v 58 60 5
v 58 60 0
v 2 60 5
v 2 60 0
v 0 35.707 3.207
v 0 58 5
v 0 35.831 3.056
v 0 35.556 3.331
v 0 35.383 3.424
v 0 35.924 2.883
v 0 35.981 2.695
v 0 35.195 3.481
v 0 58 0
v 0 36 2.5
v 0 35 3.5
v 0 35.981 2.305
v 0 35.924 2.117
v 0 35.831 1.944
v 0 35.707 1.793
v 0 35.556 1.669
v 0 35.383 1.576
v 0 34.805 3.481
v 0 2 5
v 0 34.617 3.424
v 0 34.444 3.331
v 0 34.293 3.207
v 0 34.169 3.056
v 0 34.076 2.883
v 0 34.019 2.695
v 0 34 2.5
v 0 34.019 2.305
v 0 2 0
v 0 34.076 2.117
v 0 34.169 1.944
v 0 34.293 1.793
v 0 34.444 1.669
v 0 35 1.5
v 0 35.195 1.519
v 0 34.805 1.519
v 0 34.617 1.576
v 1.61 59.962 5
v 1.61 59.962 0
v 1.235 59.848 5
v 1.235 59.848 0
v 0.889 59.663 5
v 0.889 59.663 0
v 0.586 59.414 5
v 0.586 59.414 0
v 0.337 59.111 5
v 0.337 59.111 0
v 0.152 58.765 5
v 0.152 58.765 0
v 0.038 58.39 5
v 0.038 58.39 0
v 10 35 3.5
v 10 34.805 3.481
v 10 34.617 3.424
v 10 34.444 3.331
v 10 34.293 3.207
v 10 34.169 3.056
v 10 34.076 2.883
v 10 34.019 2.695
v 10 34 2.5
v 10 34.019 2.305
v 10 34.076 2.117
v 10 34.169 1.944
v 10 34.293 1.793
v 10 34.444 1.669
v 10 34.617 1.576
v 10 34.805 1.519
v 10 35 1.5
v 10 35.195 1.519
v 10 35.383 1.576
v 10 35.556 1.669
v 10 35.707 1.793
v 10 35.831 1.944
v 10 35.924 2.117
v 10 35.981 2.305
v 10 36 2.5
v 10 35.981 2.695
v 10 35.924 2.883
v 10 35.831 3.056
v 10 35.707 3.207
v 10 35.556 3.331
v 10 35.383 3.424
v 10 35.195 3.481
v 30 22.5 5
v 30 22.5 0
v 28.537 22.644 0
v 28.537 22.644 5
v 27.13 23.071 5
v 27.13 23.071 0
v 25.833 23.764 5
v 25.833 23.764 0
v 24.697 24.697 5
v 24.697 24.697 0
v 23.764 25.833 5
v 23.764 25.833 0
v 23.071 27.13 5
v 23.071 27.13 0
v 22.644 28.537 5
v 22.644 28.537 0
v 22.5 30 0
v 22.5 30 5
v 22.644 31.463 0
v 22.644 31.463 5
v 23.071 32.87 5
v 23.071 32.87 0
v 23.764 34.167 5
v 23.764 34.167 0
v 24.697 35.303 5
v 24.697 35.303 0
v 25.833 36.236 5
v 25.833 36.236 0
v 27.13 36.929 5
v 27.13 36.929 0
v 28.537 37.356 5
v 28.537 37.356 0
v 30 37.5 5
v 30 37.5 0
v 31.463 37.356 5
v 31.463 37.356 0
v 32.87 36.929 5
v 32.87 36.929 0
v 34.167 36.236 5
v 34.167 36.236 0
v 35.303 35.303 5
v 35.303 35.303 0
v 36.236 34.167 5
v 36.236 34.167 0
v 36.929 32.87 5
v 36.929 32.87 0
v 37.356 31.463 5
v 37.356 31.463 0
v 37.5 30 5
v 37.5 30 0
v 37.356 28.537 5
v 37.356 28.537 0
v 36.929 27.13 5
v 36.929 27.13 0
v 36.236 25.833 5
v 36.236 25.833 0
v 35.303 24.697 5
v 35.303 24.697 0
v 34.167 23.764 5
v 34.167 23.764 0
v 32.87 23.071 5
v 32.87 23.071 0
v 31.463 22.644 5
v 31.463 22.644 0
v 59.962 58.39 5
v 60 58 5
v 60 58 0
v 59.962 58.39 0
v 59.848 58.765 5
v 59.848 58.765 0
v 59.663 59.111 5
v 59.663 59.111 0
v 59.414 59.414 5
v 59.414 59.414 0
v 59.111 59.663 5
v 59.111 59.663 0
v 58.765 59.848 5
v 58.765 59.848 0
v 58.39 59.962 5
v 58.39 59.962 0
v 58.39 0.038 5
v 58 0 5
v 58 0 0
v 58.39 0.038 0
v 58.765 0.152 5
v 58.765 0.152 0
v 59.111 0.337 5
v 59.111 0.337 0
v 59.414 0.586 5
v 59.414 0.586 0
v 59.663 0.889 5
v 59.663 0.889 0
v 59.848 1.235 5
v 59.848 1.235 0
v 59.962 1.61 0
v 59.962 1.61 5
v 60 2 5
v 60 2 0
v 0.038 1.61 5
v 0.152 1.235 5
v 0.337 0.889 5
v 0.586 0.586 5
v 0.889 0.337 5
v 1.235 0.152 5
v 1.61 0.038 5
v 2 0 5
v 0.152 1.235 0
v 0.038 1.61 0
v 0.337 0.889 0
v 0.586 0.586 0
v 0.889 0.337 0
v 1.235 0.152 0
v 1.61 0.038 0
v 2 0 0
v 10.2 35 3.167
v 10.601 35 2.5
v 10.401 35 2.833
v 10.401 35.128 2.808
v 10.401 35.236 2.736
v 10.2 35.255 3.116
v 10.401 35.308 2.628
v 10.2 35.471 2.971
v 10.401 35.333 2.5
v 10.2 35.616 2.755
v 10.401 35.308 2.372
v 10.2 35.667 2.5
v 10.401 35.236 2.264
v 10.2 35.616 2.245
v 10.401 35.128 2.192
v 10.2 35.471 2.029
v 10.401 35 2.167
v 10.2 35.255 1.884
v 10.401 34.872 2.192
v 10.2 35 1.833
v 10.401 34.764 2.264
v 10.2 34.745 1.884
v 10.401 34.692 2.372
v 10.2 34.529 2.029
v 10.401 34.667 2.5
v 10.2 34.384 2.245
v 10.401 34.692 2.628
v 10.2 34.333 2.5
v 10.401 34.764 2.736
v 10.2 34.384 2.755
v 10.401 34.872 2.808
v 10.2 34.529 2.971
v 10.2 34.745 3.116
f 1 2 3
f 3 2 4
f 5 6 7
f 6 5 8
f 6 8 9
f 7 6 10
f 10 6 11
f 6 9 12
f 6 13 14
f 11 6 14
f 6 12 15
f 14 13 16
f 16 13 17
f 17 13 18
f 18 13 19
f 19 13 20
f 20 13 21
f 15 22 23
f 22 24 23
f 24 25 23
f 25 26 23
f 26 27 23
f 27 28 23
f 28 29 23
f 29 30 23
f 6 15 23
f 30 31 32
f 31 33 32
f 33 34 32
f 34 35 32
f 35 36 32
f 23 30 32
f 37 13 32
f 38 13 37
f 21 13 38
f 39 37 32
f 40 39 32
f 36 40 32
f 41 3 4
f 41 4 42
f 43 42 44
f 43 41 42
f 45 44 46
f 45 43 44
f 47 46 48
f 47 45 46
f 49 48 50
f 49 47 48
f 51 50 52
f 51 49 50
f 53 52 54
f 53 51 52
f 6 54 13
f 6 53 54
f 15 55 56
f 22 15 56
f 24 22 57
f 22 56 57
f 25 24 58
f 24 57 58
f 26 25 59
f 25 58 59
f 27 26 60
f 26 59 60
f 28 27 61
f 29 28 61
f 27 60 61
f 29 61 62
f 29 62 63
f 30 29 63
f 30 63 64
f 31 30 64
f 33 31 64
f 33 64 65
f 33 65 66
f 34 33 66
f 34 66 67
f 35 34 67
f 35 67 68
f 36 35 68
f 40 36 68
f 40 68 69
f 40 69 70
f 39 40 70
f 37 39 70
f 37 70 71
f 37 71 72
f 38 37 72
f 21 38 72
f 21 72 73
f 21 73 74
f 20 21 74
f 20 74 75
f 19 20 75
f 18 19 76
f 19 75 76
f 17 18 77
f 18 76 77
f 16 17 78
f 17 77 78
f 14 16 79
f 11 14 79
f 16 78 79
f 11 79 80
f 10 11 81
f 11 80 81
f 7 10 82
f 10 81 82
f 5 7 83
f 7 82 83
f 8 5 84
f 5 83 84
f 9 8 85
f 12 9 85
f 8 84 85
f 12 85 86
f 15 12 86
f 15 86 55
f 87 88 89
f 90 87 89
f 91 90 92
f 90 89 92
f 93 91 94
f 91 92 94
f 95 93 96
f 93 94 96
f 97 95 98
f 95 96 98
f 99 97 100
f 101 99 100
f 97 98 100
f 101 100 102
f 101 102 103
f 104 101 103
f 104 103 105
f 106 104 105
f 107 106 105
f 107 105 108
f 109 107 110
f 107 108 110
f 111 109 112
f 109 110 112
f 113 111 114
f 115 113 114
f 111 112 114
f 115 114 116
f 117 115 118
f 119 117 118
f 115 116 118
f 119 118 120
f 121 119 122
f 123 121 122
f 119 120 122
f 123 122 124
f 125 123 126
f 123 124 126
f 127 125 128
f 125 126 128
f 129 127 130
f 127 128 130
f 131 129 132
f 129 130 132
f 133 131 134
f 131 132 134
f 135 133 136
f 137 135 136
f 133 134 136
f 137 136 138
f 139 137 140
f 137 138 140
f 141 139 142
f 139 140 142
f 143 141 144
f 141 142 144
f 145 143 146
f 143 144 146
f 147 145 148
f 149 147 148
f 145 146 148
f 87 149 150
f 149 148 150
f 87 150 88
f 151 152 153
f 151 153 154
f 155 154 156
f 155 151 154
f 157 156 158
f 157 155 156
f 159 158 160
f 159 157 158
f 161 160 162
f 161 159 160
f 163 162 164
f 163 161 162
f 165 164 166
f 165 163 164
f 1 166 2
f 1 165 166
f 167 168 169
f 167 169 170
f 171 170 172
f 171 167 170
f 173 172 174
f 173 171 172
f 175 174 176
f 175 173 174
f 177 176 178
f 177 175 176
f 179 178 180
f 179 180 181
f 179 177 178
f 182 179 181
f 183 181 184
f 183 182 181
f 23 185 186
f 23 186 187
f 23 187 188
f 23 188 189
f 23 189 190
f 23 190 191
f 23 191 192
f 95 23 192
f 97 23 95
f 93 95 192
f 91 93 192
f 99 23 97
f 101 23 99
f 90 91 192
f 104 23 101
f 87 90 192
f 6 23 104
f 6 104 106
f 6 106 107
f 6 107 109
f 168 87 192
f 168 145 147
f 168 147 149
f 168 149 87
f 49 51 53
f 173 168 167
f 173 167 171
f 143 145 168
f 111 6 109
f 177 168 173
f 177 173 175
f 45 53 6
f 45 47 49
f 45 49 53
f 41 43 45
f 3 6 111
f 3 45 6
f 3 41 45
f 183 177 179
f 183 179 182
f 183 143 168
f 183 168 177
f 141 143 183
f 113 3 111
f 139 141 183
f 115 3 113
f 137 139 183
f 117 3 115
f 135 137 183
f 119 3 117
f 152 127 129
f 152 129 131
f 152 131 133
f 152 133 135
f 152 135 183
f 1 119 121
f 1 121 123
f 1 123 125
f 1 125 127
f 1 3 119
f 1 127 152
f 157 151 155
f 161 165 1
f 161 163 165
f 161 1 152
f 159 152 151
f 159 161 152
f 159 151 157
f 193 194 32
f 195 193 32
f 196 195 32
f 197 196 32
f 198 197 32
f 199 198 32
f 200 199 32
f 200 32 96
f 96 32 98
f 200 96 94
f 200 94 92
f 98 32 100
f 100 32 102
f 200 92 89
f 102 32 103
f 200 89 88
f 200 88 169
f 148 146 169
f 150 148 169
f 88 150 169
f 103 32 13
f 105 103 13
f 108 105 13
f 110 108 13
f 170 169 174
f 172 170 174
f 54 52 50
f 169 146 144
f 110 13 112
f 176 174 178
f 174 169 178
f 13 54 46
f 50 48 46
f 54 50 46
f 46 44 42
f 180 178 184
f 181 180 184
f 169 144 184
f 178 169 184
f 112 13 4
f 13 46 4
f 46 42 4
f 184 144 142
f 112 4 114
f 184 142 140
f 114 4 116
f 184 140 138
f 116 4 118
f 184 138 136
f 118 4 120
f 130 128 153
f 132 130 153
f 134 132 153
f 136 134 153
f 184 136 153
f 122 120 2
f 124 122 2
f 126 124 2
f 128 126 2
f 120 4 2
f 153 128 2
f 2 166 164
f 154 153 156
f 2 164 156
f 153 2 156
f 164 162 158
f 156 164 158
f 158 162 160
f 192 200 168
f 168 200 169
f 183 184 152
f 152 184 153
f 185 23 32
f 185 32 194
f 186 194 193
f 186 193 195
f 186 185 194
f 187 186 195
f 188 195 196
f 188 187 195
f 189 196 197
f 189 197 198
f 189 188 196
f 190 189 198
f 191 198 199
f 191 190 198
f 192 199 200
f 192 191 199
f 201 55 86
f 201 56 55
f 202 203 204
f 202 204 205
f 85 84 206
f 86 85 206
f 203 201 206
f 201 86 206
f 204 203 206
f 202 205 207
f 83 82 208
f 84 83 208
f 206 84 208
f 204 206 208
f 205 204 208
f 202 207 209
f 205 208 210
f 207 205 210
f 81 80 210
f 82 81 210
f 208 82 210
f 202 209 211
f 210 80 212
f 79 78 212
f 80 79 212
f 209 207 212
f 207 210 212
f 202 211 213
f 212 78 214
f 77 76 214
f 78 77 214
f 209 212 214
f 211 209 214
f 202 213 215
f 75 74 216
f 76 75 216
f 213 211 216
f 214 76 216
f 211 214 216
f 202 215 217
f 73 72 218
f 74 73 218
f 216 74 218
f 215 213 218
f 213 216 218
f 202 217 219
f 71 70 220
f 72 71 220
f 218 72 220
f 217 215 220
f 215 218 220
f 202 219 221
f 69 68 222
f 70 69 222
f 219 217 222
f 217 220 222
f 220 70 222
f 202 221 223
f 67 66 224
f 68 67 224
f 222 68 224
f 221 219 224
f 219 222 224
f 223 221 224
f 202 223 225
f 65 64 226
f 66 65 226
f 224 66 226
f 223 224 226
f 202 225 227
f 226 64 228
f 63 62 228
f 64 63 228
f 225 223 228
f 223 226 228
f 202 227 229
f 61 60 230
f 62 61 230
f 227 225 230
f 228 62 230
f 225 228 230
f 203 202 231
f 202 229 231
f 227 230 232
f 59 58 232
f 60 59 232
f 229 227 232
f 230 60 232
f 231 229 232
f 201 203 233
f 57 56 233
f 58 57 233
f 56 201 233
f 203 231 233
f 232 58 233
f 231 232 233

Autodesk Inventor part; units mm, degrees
ref_plane "YZ Plane" through (0, 0, 0) normal (1, 0, 0) x (0, 1, 0)
ref_plane "XZ Plane" through (0, 0, 0) normal (0, 1, 0) x (-1, 0, 0)
ref_plane "XY Plane" through (0, 0, 0) normal (0, 0, 1) x (1, 0, 0)
sketch "Sketch1" plane through (0, 0, 0) normal (0, 0, 1) x (1, 0, 0)
  line L0 (0, 0) -> (60, 0)
  line L1 (60, 0) -> (60, 60)
  line L2 (60, 60) -> (0, 60)
  line L3 (0, 60) -> (0, 0)
  dimension "d0" = 60
  dimension "d1" = 60
extrude "Extrusion1" add sketch "Sketch1" along normal blind 5
sketch "Sketch2" plane through (0, 0, 5) normal (0, 0, 1) x (1, 0, 0)
  line L0 (60, 60) -> (0, 60) projected
  line L1 (60, 0) -> (60, 60) projected
  point P0 (0, 0)
  point P1 (30, 30)
  dimension "d4" = 30
  dimension "d5" = 30
hole "Hole1" at (30, 30, 5) direction (0, 0, -1) diameter 15 end through all
fillet "Fillet1" radius 2 4 edges at (60, 60, 2.5) (60, 0, 2.5) (0, 0, 2.5) (0, 60, 2.5)
sketch "Sketch5" plane through (0, 2, 0) normal (-1, 0, 0) x (0, 0, 1)
  line L0 (0, 56) -> (0, 0) projected
  line L1 (0, -2) -> (5, -2) projected
  point P0 (2.5, 33)
  dimension "d36" = 2.5
  dimension "d37" = 35
hole "Hole4" at (0, 35, 2.5) direction (1, 0, 0) diameter 2 depth 10 tip angle 118
properties part number "Motor clamp p1"
